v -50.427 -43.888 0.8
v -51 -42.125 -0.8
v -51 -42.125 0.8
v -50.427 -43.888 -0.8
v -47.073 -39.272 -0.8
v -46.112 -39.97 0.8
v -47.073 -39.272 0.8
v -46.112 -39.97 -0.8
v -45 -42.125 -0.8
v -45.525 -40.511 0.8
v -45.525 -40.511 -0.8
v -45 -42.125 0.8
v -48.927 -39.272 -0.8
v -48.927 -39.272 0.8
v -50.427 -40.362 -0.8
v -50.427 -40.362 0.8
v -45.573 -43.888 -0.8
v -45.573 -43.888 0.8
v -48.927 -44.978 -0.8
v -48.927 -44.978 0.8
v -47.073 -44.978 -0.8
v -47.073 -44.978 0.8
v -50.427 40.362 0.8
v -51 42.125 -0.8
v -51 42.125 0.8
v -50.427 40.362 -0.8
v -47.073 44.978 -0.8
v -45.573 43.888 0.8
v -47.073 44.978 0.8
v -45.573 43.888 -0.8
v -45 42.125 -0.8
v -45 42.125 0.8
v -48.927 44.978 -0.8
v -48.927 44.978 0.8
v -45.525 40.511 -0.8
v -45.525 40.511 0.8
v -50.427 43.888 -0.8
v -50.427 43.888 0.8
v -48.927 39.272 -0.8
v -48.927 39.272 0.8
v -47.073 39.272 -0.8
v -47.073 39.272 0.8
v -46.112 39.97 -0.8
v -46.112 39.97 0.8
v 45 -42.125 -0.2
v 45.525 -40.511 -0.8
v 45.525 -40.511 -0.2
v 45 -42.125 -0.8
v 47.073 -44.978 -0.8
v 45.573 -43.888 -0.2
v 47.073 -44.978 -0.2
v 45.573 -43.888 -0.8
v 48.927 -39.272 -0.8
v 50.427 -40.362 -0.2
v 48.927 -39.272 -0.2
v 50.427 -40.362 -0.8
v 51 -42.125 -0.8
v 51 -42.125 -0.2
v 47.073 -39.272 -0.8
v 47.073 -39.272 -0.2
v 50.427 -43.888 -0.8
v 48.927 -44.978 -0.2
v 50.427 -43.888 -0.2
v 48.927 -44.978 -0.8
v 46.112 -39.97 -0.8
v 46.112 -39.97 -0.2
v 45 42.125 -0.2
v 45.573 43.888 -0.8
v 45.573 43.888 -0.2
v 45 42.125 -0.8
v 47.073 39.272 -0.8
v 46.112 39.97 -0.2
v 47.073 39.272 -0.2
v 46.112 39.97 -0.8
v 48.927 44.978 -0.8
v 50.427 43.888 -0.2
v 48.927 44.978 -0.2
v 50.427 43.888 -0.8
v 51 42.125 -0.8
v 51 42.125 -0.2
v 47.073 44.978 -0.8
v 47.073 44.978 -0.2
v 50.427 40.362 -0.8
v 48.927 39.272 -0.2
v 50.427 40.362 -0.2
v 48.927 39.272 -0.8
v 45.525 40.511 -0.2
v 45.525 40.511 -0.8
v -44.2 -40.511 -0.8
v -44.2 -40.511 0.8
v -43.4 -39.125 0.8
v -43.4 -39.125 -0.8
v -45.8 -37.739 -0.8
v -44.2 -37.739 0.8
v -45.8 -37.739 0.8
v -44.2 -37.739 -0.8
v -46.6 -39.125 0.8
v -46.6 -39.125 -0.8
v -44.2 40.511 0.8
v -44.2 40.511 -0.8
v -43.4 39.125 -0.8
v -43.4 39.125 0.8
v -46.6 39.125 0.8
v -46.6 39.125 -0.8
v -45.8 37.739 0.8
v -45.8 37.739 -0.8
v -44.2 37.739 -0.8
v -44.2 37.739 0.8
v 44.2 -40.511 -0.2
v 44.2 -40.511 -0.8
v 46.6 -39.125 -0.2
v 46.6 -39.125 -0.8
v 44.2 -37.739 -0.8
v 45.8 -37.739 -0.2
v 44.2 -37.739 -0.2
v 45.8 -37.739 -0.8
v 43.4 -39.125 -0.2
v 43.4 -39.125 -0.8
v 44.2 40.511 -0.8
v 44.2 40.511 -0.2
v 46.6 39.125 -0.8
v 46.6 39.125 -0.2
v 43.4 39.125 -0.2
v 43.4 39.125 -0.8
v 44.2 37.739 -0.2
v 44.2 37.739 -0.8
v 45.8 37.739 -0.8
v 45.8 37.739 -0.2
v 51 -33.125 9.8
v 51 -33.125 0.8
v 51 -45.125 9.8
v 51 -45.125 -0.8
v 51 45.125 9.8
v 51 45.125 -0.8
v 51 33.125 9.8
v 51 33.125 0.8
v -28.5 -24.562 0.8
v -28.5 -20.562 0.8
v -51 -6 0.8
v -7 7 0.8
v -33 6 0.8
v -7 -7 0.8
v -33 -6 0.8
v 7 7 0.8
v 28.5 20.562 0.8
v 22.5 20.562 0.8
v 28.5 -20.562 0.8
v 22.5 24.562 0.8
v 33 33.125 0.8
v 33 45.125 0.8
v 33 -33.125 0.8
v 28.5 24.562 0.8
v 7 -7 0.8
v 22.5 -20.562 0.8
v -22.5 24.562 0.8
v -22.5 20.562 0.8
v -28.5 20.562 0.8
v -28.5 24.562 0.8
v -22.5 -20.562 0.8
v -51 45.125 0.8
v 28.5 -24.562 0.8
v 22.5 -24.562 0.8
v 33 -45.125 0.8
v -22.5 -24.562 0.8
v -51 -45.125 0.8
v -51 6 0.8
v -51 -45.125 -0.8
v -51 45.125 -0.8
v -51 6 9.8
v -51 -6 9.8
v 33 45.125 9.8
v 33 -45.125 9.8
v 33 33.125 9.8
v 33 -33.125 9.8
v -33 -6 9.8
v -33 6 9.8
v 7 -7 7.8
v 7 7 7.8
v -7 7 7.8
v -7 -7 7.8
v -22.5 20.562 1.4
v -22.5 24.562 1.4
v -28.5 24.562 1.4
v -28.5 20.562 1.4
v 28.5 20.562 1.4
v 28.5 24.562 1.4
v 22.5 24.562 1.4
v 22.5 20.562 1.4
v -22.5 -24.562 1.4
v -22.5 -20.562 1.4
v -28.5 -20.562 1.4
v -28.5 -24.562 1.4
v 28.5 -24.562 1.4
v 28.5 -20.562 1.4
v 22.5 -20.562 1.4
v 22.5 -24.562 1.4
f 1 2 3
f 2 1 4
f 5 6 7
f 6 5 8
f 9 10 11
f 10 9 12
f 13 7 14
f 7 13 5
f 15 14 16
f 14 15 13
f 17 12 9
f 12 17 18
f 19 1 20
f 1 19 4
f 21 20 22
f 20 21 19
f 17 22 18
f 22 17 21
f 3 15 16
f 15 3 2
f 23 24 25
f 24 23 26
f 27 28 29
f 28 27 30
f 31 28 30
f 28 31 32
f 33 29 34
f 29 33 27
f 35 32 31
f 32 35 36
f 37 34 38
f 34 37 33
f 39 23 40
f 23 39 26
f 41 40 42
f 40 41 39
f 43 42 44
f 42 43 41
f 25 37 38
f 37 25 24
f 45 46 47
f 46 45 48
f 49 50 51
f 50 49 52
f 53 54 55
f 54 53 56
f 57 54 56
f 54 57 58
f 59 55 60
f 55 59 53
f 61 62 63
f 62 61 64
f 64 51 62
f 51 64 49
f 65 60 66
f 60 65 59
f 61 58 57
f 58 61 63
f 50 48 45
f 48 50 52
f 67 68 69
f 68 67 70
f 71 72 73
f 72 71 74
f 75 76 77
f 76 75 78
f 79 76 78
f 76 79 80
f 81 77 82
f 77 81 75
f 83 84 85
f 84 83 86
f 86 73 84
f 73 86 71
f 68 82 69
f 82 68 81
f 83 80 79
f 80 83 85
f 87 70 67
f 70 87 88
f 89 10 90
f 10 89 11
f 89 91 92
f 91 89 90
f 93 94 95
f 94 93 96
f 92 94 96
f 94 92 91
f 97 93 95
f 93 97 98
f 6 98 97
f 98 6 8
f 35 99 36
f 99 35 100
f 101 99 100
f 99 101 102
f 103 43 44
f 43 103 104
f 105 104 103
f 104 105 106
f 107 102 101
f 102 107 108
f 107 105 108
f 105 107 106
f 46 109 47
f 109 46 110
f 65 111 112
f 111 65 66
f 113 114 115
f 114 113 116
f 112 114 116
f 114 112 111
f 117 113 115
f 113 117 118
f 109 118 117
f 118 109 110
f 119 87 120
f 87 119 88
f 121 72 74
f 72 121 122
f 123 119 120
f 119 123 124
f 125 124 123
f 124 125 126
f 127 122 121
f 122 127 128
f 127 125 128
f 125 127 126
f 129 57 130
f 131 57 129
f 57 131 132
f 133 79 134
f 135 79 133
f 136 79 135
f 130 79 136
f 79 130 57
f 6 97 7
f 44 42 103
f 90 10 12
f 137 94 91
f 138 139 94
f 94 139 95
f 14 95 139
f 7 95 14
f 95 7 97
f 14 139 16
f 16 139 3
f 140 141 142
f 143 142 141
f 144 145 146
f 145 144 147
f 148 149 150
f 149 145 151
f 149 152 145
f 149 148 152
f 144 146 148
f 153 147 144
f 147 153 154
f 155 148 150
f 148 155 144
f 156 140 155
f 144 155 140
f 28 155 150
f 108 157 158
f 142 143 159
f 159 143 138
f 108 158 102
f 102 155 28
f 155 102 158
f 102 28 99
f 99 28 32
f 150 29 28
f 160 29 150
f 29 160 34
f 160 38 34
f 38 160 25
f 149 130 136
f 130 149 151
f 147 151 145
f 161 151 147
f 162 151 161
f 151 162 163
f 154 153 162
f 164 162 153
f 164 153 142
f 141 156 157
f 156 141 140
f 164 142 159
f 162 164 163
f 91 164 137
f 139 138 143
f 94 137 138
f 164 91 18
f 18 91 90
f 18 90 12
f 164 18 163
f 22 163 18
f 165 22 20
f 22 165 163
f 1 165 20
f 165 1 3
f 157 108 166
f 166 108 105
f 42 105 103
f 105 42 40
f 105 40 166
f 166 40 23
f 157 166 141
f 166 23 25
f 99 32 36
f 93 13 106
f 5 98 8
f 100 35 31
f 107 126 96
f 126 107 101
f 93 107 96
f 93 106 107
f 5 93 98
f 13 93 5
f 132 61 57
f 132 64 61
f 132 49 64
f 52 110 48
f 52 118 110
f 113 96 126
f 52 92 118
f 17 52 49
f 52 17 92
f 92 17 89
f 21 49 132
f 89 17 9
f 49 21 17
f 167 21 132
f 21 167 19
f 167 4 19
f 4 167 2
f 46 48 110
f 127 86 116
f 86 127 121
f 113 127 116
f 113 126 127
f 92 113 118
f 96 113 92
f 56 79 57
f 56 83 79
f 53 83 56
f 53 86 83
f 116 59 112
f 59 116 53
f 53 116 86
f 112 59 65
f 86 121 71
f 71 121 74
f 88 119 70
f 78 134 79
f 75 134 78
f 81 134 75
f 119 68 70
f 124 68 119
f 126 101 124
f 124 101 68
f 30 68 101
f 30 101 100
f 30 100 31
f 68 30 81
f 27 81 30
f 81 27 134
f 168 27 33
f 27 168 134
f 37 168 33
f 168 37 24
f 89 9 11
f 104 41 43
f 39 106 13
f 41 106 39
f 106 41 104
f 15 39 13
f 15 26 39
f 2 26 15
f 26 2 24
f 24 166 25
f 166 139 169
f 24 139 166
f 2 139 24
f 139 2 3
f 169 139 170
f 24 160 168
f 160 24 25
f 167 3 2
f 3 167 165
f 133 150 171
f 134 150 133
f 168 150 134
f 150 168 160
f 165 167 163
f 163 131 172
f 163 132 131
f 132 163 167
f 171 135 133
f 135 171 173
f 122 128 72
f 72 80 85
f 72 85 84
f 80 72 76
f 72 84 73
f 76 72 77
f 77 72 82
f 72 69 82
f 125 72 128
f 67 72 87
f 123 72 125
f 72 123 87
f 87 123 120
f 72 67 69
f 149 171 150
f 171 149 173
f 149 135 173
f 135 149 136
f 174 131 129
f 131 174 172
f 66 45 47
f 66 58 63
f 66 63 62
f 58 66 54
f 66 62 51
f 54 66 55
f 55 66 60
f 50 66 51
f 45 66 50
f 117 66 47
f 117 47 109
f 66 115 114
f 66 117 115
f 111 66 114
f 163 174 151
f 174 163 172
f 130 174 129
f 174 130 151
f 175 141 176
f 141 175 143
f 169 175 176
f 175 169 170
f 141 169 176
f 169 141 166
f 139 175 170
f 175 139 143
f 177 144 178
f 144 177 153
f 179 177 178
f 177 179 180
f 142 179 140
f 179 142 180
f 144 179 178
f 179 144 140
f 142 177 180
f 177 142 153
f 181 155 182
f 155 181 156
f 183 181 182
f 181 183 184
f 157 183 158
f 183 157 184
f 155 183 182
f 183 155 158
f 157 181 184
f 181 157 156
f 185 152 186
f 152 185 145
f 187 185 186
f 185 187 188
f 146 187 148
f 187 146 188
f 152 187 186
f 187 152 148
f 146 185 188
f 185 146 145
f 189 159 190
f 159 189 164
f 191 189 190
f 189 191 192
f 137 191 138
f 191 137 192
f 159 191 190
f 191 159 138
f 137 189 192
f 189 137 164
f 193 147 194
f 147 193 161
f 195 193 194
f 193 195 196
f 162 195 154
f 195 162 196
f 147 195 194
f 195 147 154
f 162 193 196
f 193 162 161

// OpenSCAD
// Parameters
pcb_L = 102.0; //[51.0:204.0:0.25]
pcb_W = 90.25; //[45.0:180.5:0.25]
pcb_T = 1.6; //[0.8:3.2:0.1]
corner_R = 3.0; //[1.5:6.0:0.25]
mount_hole_d = 3.2; //[2.0:6.0:0.1]
mount_edge_margin = 6.0; //[3.0:12.0:0.25]
hole_clearance_z = 0.5; //[0.2:2.0:0.1]
attach_overlap = 1.0; //[0.5:2.0:0.1]
conn_L = 18.0; //[9.0:36.0:0.5]
conn_W = 12.0; //[6.0:24.0:0.5]
conn_H = 10.0; //[5.0:20.0:0.5]
heatsink_L = 14.0; //[7.0:28.0:0.5]
heatsink_W = 14.0; //[7.0:28.0:0.5]
heatsink_H = 8.0; //[4.0:16.0:0.5]
chip_L = 12.0; //[6.0:24.0:0.5]
chip_W = 12.0; //[6.0:24.0:0.5]
chip_H = 2.0; //[1.0:5.0:0.1]
small_chip_L = 6.0; //[3.0:12.0:0.25]
small_chip_W = 4.0; //[2.0:8.0:0.25]
small_chip_H = 1.6; //[0.8:3.2:0.1]

// Mainboard PCB with rounded corners and mounting holes
module pcb_with_mounting_holes() {
  difference() {
    // PCB main body
    color([0.0, 0.4, 0.2]) // Green PCB
    cube([pcb_L, pcb_W, pcb_T], center=true);
    
    // Rounded corners
    for (x = [-1, 1], y = [-1, 1]) {
      translate([x * (pcb_L/2 - corner_R), y * (pcb_W/2 - corner_R), 0])
        cylinder(r=corner_R, h=pcb_T + hole_clearance_z, center=true);
    }
    
    // Mounting holes
    for (x = [-1, 1], y = [-1, 1]) {
      translate([x * (pcb_L/2 - mount_edge_margin), y * (pcb_W/2 - mount_edge_margin), 0])
        cylinder(r=mount_hole_d/2, h=pcb_T + hole_clearance_z, center=true);
    }
  }
}

// Connector module
module connector_body() {
  color([0.85, 0.85, 0.8]) // Off-white for connectors
  cube([conn_L, conn_W, conn_H], center=true);
}

// Heatsink module
module heatsink_body() {
  color([0.4, 0.4, 0.43]) // DimGray for heatsinks
  cube([heatsink_L, heatsink_W, heatsink_H], center=true);
}

// Main chip module
module chip_main() {
  color([0.1, 0.1, 0.6]) // Blue for main chip
  cube([chip_L, chip_W, chip_H], center=true);
}

// Small chip module
module chip_small() {
  color([0.1, 0.1, 0.6]) // Blue for small chips
  cube([small_chip_L, small_chip_W, small_chip_H], center=true);
}

// Complete mainboard model
module complete_mainboard_model() {
  union() {
    pcb_with_mounting_holes();
    
    // Connectors
    translate([pcb_L/2 - conn_L/2, pcb_W/2 - conn_W/2, pcb_T/2 + conn_H/2 - attach_overlap])
      connector_body();
    translate([pcb_L/2 - conn_L/2, -pcb_W/2 + conn_W/2, pcb_T/2 + conn_H/2 - attach_overlap])
      connector_body();
    translate([-pcb_L/2 + conn_L/2, 0, pcb_T/2 + conn_H/2 - attach_overlap])
      connector_body();
    
    // Main chip and heatsink
    translate([0, 0, pcb_T/2 + chip_H/2 - attach_overlap])
      chip_main();
    translate([0, 0, pcb_T/2 + heatsink_H/2 - attach_overlap])
      heatsink_body();
    
    // Small chips
    translate([-pcb_L/4, pcb_W/4, pcb_T/2 + small_chip_H/2 - attach_overlap])
      chip_small();
    translate([pcb_L/4, pcb_W/4, pcb_T/2 + small_chip_H/2 - attach_overlap])
      chip_small();
    translate([-pcb_L/4, -pcb_W/4, pcb_T/2 + small_chip_H/2 - attach_overlap])
      chip_small();
    translate([pcb_L/4, -pcb_W/4, pcb_T/2 + small_chip_H/2 - attach_overlap])
      chip_small();
  }
}

// Render the complete mainboard model
complete_mainboard_model();
